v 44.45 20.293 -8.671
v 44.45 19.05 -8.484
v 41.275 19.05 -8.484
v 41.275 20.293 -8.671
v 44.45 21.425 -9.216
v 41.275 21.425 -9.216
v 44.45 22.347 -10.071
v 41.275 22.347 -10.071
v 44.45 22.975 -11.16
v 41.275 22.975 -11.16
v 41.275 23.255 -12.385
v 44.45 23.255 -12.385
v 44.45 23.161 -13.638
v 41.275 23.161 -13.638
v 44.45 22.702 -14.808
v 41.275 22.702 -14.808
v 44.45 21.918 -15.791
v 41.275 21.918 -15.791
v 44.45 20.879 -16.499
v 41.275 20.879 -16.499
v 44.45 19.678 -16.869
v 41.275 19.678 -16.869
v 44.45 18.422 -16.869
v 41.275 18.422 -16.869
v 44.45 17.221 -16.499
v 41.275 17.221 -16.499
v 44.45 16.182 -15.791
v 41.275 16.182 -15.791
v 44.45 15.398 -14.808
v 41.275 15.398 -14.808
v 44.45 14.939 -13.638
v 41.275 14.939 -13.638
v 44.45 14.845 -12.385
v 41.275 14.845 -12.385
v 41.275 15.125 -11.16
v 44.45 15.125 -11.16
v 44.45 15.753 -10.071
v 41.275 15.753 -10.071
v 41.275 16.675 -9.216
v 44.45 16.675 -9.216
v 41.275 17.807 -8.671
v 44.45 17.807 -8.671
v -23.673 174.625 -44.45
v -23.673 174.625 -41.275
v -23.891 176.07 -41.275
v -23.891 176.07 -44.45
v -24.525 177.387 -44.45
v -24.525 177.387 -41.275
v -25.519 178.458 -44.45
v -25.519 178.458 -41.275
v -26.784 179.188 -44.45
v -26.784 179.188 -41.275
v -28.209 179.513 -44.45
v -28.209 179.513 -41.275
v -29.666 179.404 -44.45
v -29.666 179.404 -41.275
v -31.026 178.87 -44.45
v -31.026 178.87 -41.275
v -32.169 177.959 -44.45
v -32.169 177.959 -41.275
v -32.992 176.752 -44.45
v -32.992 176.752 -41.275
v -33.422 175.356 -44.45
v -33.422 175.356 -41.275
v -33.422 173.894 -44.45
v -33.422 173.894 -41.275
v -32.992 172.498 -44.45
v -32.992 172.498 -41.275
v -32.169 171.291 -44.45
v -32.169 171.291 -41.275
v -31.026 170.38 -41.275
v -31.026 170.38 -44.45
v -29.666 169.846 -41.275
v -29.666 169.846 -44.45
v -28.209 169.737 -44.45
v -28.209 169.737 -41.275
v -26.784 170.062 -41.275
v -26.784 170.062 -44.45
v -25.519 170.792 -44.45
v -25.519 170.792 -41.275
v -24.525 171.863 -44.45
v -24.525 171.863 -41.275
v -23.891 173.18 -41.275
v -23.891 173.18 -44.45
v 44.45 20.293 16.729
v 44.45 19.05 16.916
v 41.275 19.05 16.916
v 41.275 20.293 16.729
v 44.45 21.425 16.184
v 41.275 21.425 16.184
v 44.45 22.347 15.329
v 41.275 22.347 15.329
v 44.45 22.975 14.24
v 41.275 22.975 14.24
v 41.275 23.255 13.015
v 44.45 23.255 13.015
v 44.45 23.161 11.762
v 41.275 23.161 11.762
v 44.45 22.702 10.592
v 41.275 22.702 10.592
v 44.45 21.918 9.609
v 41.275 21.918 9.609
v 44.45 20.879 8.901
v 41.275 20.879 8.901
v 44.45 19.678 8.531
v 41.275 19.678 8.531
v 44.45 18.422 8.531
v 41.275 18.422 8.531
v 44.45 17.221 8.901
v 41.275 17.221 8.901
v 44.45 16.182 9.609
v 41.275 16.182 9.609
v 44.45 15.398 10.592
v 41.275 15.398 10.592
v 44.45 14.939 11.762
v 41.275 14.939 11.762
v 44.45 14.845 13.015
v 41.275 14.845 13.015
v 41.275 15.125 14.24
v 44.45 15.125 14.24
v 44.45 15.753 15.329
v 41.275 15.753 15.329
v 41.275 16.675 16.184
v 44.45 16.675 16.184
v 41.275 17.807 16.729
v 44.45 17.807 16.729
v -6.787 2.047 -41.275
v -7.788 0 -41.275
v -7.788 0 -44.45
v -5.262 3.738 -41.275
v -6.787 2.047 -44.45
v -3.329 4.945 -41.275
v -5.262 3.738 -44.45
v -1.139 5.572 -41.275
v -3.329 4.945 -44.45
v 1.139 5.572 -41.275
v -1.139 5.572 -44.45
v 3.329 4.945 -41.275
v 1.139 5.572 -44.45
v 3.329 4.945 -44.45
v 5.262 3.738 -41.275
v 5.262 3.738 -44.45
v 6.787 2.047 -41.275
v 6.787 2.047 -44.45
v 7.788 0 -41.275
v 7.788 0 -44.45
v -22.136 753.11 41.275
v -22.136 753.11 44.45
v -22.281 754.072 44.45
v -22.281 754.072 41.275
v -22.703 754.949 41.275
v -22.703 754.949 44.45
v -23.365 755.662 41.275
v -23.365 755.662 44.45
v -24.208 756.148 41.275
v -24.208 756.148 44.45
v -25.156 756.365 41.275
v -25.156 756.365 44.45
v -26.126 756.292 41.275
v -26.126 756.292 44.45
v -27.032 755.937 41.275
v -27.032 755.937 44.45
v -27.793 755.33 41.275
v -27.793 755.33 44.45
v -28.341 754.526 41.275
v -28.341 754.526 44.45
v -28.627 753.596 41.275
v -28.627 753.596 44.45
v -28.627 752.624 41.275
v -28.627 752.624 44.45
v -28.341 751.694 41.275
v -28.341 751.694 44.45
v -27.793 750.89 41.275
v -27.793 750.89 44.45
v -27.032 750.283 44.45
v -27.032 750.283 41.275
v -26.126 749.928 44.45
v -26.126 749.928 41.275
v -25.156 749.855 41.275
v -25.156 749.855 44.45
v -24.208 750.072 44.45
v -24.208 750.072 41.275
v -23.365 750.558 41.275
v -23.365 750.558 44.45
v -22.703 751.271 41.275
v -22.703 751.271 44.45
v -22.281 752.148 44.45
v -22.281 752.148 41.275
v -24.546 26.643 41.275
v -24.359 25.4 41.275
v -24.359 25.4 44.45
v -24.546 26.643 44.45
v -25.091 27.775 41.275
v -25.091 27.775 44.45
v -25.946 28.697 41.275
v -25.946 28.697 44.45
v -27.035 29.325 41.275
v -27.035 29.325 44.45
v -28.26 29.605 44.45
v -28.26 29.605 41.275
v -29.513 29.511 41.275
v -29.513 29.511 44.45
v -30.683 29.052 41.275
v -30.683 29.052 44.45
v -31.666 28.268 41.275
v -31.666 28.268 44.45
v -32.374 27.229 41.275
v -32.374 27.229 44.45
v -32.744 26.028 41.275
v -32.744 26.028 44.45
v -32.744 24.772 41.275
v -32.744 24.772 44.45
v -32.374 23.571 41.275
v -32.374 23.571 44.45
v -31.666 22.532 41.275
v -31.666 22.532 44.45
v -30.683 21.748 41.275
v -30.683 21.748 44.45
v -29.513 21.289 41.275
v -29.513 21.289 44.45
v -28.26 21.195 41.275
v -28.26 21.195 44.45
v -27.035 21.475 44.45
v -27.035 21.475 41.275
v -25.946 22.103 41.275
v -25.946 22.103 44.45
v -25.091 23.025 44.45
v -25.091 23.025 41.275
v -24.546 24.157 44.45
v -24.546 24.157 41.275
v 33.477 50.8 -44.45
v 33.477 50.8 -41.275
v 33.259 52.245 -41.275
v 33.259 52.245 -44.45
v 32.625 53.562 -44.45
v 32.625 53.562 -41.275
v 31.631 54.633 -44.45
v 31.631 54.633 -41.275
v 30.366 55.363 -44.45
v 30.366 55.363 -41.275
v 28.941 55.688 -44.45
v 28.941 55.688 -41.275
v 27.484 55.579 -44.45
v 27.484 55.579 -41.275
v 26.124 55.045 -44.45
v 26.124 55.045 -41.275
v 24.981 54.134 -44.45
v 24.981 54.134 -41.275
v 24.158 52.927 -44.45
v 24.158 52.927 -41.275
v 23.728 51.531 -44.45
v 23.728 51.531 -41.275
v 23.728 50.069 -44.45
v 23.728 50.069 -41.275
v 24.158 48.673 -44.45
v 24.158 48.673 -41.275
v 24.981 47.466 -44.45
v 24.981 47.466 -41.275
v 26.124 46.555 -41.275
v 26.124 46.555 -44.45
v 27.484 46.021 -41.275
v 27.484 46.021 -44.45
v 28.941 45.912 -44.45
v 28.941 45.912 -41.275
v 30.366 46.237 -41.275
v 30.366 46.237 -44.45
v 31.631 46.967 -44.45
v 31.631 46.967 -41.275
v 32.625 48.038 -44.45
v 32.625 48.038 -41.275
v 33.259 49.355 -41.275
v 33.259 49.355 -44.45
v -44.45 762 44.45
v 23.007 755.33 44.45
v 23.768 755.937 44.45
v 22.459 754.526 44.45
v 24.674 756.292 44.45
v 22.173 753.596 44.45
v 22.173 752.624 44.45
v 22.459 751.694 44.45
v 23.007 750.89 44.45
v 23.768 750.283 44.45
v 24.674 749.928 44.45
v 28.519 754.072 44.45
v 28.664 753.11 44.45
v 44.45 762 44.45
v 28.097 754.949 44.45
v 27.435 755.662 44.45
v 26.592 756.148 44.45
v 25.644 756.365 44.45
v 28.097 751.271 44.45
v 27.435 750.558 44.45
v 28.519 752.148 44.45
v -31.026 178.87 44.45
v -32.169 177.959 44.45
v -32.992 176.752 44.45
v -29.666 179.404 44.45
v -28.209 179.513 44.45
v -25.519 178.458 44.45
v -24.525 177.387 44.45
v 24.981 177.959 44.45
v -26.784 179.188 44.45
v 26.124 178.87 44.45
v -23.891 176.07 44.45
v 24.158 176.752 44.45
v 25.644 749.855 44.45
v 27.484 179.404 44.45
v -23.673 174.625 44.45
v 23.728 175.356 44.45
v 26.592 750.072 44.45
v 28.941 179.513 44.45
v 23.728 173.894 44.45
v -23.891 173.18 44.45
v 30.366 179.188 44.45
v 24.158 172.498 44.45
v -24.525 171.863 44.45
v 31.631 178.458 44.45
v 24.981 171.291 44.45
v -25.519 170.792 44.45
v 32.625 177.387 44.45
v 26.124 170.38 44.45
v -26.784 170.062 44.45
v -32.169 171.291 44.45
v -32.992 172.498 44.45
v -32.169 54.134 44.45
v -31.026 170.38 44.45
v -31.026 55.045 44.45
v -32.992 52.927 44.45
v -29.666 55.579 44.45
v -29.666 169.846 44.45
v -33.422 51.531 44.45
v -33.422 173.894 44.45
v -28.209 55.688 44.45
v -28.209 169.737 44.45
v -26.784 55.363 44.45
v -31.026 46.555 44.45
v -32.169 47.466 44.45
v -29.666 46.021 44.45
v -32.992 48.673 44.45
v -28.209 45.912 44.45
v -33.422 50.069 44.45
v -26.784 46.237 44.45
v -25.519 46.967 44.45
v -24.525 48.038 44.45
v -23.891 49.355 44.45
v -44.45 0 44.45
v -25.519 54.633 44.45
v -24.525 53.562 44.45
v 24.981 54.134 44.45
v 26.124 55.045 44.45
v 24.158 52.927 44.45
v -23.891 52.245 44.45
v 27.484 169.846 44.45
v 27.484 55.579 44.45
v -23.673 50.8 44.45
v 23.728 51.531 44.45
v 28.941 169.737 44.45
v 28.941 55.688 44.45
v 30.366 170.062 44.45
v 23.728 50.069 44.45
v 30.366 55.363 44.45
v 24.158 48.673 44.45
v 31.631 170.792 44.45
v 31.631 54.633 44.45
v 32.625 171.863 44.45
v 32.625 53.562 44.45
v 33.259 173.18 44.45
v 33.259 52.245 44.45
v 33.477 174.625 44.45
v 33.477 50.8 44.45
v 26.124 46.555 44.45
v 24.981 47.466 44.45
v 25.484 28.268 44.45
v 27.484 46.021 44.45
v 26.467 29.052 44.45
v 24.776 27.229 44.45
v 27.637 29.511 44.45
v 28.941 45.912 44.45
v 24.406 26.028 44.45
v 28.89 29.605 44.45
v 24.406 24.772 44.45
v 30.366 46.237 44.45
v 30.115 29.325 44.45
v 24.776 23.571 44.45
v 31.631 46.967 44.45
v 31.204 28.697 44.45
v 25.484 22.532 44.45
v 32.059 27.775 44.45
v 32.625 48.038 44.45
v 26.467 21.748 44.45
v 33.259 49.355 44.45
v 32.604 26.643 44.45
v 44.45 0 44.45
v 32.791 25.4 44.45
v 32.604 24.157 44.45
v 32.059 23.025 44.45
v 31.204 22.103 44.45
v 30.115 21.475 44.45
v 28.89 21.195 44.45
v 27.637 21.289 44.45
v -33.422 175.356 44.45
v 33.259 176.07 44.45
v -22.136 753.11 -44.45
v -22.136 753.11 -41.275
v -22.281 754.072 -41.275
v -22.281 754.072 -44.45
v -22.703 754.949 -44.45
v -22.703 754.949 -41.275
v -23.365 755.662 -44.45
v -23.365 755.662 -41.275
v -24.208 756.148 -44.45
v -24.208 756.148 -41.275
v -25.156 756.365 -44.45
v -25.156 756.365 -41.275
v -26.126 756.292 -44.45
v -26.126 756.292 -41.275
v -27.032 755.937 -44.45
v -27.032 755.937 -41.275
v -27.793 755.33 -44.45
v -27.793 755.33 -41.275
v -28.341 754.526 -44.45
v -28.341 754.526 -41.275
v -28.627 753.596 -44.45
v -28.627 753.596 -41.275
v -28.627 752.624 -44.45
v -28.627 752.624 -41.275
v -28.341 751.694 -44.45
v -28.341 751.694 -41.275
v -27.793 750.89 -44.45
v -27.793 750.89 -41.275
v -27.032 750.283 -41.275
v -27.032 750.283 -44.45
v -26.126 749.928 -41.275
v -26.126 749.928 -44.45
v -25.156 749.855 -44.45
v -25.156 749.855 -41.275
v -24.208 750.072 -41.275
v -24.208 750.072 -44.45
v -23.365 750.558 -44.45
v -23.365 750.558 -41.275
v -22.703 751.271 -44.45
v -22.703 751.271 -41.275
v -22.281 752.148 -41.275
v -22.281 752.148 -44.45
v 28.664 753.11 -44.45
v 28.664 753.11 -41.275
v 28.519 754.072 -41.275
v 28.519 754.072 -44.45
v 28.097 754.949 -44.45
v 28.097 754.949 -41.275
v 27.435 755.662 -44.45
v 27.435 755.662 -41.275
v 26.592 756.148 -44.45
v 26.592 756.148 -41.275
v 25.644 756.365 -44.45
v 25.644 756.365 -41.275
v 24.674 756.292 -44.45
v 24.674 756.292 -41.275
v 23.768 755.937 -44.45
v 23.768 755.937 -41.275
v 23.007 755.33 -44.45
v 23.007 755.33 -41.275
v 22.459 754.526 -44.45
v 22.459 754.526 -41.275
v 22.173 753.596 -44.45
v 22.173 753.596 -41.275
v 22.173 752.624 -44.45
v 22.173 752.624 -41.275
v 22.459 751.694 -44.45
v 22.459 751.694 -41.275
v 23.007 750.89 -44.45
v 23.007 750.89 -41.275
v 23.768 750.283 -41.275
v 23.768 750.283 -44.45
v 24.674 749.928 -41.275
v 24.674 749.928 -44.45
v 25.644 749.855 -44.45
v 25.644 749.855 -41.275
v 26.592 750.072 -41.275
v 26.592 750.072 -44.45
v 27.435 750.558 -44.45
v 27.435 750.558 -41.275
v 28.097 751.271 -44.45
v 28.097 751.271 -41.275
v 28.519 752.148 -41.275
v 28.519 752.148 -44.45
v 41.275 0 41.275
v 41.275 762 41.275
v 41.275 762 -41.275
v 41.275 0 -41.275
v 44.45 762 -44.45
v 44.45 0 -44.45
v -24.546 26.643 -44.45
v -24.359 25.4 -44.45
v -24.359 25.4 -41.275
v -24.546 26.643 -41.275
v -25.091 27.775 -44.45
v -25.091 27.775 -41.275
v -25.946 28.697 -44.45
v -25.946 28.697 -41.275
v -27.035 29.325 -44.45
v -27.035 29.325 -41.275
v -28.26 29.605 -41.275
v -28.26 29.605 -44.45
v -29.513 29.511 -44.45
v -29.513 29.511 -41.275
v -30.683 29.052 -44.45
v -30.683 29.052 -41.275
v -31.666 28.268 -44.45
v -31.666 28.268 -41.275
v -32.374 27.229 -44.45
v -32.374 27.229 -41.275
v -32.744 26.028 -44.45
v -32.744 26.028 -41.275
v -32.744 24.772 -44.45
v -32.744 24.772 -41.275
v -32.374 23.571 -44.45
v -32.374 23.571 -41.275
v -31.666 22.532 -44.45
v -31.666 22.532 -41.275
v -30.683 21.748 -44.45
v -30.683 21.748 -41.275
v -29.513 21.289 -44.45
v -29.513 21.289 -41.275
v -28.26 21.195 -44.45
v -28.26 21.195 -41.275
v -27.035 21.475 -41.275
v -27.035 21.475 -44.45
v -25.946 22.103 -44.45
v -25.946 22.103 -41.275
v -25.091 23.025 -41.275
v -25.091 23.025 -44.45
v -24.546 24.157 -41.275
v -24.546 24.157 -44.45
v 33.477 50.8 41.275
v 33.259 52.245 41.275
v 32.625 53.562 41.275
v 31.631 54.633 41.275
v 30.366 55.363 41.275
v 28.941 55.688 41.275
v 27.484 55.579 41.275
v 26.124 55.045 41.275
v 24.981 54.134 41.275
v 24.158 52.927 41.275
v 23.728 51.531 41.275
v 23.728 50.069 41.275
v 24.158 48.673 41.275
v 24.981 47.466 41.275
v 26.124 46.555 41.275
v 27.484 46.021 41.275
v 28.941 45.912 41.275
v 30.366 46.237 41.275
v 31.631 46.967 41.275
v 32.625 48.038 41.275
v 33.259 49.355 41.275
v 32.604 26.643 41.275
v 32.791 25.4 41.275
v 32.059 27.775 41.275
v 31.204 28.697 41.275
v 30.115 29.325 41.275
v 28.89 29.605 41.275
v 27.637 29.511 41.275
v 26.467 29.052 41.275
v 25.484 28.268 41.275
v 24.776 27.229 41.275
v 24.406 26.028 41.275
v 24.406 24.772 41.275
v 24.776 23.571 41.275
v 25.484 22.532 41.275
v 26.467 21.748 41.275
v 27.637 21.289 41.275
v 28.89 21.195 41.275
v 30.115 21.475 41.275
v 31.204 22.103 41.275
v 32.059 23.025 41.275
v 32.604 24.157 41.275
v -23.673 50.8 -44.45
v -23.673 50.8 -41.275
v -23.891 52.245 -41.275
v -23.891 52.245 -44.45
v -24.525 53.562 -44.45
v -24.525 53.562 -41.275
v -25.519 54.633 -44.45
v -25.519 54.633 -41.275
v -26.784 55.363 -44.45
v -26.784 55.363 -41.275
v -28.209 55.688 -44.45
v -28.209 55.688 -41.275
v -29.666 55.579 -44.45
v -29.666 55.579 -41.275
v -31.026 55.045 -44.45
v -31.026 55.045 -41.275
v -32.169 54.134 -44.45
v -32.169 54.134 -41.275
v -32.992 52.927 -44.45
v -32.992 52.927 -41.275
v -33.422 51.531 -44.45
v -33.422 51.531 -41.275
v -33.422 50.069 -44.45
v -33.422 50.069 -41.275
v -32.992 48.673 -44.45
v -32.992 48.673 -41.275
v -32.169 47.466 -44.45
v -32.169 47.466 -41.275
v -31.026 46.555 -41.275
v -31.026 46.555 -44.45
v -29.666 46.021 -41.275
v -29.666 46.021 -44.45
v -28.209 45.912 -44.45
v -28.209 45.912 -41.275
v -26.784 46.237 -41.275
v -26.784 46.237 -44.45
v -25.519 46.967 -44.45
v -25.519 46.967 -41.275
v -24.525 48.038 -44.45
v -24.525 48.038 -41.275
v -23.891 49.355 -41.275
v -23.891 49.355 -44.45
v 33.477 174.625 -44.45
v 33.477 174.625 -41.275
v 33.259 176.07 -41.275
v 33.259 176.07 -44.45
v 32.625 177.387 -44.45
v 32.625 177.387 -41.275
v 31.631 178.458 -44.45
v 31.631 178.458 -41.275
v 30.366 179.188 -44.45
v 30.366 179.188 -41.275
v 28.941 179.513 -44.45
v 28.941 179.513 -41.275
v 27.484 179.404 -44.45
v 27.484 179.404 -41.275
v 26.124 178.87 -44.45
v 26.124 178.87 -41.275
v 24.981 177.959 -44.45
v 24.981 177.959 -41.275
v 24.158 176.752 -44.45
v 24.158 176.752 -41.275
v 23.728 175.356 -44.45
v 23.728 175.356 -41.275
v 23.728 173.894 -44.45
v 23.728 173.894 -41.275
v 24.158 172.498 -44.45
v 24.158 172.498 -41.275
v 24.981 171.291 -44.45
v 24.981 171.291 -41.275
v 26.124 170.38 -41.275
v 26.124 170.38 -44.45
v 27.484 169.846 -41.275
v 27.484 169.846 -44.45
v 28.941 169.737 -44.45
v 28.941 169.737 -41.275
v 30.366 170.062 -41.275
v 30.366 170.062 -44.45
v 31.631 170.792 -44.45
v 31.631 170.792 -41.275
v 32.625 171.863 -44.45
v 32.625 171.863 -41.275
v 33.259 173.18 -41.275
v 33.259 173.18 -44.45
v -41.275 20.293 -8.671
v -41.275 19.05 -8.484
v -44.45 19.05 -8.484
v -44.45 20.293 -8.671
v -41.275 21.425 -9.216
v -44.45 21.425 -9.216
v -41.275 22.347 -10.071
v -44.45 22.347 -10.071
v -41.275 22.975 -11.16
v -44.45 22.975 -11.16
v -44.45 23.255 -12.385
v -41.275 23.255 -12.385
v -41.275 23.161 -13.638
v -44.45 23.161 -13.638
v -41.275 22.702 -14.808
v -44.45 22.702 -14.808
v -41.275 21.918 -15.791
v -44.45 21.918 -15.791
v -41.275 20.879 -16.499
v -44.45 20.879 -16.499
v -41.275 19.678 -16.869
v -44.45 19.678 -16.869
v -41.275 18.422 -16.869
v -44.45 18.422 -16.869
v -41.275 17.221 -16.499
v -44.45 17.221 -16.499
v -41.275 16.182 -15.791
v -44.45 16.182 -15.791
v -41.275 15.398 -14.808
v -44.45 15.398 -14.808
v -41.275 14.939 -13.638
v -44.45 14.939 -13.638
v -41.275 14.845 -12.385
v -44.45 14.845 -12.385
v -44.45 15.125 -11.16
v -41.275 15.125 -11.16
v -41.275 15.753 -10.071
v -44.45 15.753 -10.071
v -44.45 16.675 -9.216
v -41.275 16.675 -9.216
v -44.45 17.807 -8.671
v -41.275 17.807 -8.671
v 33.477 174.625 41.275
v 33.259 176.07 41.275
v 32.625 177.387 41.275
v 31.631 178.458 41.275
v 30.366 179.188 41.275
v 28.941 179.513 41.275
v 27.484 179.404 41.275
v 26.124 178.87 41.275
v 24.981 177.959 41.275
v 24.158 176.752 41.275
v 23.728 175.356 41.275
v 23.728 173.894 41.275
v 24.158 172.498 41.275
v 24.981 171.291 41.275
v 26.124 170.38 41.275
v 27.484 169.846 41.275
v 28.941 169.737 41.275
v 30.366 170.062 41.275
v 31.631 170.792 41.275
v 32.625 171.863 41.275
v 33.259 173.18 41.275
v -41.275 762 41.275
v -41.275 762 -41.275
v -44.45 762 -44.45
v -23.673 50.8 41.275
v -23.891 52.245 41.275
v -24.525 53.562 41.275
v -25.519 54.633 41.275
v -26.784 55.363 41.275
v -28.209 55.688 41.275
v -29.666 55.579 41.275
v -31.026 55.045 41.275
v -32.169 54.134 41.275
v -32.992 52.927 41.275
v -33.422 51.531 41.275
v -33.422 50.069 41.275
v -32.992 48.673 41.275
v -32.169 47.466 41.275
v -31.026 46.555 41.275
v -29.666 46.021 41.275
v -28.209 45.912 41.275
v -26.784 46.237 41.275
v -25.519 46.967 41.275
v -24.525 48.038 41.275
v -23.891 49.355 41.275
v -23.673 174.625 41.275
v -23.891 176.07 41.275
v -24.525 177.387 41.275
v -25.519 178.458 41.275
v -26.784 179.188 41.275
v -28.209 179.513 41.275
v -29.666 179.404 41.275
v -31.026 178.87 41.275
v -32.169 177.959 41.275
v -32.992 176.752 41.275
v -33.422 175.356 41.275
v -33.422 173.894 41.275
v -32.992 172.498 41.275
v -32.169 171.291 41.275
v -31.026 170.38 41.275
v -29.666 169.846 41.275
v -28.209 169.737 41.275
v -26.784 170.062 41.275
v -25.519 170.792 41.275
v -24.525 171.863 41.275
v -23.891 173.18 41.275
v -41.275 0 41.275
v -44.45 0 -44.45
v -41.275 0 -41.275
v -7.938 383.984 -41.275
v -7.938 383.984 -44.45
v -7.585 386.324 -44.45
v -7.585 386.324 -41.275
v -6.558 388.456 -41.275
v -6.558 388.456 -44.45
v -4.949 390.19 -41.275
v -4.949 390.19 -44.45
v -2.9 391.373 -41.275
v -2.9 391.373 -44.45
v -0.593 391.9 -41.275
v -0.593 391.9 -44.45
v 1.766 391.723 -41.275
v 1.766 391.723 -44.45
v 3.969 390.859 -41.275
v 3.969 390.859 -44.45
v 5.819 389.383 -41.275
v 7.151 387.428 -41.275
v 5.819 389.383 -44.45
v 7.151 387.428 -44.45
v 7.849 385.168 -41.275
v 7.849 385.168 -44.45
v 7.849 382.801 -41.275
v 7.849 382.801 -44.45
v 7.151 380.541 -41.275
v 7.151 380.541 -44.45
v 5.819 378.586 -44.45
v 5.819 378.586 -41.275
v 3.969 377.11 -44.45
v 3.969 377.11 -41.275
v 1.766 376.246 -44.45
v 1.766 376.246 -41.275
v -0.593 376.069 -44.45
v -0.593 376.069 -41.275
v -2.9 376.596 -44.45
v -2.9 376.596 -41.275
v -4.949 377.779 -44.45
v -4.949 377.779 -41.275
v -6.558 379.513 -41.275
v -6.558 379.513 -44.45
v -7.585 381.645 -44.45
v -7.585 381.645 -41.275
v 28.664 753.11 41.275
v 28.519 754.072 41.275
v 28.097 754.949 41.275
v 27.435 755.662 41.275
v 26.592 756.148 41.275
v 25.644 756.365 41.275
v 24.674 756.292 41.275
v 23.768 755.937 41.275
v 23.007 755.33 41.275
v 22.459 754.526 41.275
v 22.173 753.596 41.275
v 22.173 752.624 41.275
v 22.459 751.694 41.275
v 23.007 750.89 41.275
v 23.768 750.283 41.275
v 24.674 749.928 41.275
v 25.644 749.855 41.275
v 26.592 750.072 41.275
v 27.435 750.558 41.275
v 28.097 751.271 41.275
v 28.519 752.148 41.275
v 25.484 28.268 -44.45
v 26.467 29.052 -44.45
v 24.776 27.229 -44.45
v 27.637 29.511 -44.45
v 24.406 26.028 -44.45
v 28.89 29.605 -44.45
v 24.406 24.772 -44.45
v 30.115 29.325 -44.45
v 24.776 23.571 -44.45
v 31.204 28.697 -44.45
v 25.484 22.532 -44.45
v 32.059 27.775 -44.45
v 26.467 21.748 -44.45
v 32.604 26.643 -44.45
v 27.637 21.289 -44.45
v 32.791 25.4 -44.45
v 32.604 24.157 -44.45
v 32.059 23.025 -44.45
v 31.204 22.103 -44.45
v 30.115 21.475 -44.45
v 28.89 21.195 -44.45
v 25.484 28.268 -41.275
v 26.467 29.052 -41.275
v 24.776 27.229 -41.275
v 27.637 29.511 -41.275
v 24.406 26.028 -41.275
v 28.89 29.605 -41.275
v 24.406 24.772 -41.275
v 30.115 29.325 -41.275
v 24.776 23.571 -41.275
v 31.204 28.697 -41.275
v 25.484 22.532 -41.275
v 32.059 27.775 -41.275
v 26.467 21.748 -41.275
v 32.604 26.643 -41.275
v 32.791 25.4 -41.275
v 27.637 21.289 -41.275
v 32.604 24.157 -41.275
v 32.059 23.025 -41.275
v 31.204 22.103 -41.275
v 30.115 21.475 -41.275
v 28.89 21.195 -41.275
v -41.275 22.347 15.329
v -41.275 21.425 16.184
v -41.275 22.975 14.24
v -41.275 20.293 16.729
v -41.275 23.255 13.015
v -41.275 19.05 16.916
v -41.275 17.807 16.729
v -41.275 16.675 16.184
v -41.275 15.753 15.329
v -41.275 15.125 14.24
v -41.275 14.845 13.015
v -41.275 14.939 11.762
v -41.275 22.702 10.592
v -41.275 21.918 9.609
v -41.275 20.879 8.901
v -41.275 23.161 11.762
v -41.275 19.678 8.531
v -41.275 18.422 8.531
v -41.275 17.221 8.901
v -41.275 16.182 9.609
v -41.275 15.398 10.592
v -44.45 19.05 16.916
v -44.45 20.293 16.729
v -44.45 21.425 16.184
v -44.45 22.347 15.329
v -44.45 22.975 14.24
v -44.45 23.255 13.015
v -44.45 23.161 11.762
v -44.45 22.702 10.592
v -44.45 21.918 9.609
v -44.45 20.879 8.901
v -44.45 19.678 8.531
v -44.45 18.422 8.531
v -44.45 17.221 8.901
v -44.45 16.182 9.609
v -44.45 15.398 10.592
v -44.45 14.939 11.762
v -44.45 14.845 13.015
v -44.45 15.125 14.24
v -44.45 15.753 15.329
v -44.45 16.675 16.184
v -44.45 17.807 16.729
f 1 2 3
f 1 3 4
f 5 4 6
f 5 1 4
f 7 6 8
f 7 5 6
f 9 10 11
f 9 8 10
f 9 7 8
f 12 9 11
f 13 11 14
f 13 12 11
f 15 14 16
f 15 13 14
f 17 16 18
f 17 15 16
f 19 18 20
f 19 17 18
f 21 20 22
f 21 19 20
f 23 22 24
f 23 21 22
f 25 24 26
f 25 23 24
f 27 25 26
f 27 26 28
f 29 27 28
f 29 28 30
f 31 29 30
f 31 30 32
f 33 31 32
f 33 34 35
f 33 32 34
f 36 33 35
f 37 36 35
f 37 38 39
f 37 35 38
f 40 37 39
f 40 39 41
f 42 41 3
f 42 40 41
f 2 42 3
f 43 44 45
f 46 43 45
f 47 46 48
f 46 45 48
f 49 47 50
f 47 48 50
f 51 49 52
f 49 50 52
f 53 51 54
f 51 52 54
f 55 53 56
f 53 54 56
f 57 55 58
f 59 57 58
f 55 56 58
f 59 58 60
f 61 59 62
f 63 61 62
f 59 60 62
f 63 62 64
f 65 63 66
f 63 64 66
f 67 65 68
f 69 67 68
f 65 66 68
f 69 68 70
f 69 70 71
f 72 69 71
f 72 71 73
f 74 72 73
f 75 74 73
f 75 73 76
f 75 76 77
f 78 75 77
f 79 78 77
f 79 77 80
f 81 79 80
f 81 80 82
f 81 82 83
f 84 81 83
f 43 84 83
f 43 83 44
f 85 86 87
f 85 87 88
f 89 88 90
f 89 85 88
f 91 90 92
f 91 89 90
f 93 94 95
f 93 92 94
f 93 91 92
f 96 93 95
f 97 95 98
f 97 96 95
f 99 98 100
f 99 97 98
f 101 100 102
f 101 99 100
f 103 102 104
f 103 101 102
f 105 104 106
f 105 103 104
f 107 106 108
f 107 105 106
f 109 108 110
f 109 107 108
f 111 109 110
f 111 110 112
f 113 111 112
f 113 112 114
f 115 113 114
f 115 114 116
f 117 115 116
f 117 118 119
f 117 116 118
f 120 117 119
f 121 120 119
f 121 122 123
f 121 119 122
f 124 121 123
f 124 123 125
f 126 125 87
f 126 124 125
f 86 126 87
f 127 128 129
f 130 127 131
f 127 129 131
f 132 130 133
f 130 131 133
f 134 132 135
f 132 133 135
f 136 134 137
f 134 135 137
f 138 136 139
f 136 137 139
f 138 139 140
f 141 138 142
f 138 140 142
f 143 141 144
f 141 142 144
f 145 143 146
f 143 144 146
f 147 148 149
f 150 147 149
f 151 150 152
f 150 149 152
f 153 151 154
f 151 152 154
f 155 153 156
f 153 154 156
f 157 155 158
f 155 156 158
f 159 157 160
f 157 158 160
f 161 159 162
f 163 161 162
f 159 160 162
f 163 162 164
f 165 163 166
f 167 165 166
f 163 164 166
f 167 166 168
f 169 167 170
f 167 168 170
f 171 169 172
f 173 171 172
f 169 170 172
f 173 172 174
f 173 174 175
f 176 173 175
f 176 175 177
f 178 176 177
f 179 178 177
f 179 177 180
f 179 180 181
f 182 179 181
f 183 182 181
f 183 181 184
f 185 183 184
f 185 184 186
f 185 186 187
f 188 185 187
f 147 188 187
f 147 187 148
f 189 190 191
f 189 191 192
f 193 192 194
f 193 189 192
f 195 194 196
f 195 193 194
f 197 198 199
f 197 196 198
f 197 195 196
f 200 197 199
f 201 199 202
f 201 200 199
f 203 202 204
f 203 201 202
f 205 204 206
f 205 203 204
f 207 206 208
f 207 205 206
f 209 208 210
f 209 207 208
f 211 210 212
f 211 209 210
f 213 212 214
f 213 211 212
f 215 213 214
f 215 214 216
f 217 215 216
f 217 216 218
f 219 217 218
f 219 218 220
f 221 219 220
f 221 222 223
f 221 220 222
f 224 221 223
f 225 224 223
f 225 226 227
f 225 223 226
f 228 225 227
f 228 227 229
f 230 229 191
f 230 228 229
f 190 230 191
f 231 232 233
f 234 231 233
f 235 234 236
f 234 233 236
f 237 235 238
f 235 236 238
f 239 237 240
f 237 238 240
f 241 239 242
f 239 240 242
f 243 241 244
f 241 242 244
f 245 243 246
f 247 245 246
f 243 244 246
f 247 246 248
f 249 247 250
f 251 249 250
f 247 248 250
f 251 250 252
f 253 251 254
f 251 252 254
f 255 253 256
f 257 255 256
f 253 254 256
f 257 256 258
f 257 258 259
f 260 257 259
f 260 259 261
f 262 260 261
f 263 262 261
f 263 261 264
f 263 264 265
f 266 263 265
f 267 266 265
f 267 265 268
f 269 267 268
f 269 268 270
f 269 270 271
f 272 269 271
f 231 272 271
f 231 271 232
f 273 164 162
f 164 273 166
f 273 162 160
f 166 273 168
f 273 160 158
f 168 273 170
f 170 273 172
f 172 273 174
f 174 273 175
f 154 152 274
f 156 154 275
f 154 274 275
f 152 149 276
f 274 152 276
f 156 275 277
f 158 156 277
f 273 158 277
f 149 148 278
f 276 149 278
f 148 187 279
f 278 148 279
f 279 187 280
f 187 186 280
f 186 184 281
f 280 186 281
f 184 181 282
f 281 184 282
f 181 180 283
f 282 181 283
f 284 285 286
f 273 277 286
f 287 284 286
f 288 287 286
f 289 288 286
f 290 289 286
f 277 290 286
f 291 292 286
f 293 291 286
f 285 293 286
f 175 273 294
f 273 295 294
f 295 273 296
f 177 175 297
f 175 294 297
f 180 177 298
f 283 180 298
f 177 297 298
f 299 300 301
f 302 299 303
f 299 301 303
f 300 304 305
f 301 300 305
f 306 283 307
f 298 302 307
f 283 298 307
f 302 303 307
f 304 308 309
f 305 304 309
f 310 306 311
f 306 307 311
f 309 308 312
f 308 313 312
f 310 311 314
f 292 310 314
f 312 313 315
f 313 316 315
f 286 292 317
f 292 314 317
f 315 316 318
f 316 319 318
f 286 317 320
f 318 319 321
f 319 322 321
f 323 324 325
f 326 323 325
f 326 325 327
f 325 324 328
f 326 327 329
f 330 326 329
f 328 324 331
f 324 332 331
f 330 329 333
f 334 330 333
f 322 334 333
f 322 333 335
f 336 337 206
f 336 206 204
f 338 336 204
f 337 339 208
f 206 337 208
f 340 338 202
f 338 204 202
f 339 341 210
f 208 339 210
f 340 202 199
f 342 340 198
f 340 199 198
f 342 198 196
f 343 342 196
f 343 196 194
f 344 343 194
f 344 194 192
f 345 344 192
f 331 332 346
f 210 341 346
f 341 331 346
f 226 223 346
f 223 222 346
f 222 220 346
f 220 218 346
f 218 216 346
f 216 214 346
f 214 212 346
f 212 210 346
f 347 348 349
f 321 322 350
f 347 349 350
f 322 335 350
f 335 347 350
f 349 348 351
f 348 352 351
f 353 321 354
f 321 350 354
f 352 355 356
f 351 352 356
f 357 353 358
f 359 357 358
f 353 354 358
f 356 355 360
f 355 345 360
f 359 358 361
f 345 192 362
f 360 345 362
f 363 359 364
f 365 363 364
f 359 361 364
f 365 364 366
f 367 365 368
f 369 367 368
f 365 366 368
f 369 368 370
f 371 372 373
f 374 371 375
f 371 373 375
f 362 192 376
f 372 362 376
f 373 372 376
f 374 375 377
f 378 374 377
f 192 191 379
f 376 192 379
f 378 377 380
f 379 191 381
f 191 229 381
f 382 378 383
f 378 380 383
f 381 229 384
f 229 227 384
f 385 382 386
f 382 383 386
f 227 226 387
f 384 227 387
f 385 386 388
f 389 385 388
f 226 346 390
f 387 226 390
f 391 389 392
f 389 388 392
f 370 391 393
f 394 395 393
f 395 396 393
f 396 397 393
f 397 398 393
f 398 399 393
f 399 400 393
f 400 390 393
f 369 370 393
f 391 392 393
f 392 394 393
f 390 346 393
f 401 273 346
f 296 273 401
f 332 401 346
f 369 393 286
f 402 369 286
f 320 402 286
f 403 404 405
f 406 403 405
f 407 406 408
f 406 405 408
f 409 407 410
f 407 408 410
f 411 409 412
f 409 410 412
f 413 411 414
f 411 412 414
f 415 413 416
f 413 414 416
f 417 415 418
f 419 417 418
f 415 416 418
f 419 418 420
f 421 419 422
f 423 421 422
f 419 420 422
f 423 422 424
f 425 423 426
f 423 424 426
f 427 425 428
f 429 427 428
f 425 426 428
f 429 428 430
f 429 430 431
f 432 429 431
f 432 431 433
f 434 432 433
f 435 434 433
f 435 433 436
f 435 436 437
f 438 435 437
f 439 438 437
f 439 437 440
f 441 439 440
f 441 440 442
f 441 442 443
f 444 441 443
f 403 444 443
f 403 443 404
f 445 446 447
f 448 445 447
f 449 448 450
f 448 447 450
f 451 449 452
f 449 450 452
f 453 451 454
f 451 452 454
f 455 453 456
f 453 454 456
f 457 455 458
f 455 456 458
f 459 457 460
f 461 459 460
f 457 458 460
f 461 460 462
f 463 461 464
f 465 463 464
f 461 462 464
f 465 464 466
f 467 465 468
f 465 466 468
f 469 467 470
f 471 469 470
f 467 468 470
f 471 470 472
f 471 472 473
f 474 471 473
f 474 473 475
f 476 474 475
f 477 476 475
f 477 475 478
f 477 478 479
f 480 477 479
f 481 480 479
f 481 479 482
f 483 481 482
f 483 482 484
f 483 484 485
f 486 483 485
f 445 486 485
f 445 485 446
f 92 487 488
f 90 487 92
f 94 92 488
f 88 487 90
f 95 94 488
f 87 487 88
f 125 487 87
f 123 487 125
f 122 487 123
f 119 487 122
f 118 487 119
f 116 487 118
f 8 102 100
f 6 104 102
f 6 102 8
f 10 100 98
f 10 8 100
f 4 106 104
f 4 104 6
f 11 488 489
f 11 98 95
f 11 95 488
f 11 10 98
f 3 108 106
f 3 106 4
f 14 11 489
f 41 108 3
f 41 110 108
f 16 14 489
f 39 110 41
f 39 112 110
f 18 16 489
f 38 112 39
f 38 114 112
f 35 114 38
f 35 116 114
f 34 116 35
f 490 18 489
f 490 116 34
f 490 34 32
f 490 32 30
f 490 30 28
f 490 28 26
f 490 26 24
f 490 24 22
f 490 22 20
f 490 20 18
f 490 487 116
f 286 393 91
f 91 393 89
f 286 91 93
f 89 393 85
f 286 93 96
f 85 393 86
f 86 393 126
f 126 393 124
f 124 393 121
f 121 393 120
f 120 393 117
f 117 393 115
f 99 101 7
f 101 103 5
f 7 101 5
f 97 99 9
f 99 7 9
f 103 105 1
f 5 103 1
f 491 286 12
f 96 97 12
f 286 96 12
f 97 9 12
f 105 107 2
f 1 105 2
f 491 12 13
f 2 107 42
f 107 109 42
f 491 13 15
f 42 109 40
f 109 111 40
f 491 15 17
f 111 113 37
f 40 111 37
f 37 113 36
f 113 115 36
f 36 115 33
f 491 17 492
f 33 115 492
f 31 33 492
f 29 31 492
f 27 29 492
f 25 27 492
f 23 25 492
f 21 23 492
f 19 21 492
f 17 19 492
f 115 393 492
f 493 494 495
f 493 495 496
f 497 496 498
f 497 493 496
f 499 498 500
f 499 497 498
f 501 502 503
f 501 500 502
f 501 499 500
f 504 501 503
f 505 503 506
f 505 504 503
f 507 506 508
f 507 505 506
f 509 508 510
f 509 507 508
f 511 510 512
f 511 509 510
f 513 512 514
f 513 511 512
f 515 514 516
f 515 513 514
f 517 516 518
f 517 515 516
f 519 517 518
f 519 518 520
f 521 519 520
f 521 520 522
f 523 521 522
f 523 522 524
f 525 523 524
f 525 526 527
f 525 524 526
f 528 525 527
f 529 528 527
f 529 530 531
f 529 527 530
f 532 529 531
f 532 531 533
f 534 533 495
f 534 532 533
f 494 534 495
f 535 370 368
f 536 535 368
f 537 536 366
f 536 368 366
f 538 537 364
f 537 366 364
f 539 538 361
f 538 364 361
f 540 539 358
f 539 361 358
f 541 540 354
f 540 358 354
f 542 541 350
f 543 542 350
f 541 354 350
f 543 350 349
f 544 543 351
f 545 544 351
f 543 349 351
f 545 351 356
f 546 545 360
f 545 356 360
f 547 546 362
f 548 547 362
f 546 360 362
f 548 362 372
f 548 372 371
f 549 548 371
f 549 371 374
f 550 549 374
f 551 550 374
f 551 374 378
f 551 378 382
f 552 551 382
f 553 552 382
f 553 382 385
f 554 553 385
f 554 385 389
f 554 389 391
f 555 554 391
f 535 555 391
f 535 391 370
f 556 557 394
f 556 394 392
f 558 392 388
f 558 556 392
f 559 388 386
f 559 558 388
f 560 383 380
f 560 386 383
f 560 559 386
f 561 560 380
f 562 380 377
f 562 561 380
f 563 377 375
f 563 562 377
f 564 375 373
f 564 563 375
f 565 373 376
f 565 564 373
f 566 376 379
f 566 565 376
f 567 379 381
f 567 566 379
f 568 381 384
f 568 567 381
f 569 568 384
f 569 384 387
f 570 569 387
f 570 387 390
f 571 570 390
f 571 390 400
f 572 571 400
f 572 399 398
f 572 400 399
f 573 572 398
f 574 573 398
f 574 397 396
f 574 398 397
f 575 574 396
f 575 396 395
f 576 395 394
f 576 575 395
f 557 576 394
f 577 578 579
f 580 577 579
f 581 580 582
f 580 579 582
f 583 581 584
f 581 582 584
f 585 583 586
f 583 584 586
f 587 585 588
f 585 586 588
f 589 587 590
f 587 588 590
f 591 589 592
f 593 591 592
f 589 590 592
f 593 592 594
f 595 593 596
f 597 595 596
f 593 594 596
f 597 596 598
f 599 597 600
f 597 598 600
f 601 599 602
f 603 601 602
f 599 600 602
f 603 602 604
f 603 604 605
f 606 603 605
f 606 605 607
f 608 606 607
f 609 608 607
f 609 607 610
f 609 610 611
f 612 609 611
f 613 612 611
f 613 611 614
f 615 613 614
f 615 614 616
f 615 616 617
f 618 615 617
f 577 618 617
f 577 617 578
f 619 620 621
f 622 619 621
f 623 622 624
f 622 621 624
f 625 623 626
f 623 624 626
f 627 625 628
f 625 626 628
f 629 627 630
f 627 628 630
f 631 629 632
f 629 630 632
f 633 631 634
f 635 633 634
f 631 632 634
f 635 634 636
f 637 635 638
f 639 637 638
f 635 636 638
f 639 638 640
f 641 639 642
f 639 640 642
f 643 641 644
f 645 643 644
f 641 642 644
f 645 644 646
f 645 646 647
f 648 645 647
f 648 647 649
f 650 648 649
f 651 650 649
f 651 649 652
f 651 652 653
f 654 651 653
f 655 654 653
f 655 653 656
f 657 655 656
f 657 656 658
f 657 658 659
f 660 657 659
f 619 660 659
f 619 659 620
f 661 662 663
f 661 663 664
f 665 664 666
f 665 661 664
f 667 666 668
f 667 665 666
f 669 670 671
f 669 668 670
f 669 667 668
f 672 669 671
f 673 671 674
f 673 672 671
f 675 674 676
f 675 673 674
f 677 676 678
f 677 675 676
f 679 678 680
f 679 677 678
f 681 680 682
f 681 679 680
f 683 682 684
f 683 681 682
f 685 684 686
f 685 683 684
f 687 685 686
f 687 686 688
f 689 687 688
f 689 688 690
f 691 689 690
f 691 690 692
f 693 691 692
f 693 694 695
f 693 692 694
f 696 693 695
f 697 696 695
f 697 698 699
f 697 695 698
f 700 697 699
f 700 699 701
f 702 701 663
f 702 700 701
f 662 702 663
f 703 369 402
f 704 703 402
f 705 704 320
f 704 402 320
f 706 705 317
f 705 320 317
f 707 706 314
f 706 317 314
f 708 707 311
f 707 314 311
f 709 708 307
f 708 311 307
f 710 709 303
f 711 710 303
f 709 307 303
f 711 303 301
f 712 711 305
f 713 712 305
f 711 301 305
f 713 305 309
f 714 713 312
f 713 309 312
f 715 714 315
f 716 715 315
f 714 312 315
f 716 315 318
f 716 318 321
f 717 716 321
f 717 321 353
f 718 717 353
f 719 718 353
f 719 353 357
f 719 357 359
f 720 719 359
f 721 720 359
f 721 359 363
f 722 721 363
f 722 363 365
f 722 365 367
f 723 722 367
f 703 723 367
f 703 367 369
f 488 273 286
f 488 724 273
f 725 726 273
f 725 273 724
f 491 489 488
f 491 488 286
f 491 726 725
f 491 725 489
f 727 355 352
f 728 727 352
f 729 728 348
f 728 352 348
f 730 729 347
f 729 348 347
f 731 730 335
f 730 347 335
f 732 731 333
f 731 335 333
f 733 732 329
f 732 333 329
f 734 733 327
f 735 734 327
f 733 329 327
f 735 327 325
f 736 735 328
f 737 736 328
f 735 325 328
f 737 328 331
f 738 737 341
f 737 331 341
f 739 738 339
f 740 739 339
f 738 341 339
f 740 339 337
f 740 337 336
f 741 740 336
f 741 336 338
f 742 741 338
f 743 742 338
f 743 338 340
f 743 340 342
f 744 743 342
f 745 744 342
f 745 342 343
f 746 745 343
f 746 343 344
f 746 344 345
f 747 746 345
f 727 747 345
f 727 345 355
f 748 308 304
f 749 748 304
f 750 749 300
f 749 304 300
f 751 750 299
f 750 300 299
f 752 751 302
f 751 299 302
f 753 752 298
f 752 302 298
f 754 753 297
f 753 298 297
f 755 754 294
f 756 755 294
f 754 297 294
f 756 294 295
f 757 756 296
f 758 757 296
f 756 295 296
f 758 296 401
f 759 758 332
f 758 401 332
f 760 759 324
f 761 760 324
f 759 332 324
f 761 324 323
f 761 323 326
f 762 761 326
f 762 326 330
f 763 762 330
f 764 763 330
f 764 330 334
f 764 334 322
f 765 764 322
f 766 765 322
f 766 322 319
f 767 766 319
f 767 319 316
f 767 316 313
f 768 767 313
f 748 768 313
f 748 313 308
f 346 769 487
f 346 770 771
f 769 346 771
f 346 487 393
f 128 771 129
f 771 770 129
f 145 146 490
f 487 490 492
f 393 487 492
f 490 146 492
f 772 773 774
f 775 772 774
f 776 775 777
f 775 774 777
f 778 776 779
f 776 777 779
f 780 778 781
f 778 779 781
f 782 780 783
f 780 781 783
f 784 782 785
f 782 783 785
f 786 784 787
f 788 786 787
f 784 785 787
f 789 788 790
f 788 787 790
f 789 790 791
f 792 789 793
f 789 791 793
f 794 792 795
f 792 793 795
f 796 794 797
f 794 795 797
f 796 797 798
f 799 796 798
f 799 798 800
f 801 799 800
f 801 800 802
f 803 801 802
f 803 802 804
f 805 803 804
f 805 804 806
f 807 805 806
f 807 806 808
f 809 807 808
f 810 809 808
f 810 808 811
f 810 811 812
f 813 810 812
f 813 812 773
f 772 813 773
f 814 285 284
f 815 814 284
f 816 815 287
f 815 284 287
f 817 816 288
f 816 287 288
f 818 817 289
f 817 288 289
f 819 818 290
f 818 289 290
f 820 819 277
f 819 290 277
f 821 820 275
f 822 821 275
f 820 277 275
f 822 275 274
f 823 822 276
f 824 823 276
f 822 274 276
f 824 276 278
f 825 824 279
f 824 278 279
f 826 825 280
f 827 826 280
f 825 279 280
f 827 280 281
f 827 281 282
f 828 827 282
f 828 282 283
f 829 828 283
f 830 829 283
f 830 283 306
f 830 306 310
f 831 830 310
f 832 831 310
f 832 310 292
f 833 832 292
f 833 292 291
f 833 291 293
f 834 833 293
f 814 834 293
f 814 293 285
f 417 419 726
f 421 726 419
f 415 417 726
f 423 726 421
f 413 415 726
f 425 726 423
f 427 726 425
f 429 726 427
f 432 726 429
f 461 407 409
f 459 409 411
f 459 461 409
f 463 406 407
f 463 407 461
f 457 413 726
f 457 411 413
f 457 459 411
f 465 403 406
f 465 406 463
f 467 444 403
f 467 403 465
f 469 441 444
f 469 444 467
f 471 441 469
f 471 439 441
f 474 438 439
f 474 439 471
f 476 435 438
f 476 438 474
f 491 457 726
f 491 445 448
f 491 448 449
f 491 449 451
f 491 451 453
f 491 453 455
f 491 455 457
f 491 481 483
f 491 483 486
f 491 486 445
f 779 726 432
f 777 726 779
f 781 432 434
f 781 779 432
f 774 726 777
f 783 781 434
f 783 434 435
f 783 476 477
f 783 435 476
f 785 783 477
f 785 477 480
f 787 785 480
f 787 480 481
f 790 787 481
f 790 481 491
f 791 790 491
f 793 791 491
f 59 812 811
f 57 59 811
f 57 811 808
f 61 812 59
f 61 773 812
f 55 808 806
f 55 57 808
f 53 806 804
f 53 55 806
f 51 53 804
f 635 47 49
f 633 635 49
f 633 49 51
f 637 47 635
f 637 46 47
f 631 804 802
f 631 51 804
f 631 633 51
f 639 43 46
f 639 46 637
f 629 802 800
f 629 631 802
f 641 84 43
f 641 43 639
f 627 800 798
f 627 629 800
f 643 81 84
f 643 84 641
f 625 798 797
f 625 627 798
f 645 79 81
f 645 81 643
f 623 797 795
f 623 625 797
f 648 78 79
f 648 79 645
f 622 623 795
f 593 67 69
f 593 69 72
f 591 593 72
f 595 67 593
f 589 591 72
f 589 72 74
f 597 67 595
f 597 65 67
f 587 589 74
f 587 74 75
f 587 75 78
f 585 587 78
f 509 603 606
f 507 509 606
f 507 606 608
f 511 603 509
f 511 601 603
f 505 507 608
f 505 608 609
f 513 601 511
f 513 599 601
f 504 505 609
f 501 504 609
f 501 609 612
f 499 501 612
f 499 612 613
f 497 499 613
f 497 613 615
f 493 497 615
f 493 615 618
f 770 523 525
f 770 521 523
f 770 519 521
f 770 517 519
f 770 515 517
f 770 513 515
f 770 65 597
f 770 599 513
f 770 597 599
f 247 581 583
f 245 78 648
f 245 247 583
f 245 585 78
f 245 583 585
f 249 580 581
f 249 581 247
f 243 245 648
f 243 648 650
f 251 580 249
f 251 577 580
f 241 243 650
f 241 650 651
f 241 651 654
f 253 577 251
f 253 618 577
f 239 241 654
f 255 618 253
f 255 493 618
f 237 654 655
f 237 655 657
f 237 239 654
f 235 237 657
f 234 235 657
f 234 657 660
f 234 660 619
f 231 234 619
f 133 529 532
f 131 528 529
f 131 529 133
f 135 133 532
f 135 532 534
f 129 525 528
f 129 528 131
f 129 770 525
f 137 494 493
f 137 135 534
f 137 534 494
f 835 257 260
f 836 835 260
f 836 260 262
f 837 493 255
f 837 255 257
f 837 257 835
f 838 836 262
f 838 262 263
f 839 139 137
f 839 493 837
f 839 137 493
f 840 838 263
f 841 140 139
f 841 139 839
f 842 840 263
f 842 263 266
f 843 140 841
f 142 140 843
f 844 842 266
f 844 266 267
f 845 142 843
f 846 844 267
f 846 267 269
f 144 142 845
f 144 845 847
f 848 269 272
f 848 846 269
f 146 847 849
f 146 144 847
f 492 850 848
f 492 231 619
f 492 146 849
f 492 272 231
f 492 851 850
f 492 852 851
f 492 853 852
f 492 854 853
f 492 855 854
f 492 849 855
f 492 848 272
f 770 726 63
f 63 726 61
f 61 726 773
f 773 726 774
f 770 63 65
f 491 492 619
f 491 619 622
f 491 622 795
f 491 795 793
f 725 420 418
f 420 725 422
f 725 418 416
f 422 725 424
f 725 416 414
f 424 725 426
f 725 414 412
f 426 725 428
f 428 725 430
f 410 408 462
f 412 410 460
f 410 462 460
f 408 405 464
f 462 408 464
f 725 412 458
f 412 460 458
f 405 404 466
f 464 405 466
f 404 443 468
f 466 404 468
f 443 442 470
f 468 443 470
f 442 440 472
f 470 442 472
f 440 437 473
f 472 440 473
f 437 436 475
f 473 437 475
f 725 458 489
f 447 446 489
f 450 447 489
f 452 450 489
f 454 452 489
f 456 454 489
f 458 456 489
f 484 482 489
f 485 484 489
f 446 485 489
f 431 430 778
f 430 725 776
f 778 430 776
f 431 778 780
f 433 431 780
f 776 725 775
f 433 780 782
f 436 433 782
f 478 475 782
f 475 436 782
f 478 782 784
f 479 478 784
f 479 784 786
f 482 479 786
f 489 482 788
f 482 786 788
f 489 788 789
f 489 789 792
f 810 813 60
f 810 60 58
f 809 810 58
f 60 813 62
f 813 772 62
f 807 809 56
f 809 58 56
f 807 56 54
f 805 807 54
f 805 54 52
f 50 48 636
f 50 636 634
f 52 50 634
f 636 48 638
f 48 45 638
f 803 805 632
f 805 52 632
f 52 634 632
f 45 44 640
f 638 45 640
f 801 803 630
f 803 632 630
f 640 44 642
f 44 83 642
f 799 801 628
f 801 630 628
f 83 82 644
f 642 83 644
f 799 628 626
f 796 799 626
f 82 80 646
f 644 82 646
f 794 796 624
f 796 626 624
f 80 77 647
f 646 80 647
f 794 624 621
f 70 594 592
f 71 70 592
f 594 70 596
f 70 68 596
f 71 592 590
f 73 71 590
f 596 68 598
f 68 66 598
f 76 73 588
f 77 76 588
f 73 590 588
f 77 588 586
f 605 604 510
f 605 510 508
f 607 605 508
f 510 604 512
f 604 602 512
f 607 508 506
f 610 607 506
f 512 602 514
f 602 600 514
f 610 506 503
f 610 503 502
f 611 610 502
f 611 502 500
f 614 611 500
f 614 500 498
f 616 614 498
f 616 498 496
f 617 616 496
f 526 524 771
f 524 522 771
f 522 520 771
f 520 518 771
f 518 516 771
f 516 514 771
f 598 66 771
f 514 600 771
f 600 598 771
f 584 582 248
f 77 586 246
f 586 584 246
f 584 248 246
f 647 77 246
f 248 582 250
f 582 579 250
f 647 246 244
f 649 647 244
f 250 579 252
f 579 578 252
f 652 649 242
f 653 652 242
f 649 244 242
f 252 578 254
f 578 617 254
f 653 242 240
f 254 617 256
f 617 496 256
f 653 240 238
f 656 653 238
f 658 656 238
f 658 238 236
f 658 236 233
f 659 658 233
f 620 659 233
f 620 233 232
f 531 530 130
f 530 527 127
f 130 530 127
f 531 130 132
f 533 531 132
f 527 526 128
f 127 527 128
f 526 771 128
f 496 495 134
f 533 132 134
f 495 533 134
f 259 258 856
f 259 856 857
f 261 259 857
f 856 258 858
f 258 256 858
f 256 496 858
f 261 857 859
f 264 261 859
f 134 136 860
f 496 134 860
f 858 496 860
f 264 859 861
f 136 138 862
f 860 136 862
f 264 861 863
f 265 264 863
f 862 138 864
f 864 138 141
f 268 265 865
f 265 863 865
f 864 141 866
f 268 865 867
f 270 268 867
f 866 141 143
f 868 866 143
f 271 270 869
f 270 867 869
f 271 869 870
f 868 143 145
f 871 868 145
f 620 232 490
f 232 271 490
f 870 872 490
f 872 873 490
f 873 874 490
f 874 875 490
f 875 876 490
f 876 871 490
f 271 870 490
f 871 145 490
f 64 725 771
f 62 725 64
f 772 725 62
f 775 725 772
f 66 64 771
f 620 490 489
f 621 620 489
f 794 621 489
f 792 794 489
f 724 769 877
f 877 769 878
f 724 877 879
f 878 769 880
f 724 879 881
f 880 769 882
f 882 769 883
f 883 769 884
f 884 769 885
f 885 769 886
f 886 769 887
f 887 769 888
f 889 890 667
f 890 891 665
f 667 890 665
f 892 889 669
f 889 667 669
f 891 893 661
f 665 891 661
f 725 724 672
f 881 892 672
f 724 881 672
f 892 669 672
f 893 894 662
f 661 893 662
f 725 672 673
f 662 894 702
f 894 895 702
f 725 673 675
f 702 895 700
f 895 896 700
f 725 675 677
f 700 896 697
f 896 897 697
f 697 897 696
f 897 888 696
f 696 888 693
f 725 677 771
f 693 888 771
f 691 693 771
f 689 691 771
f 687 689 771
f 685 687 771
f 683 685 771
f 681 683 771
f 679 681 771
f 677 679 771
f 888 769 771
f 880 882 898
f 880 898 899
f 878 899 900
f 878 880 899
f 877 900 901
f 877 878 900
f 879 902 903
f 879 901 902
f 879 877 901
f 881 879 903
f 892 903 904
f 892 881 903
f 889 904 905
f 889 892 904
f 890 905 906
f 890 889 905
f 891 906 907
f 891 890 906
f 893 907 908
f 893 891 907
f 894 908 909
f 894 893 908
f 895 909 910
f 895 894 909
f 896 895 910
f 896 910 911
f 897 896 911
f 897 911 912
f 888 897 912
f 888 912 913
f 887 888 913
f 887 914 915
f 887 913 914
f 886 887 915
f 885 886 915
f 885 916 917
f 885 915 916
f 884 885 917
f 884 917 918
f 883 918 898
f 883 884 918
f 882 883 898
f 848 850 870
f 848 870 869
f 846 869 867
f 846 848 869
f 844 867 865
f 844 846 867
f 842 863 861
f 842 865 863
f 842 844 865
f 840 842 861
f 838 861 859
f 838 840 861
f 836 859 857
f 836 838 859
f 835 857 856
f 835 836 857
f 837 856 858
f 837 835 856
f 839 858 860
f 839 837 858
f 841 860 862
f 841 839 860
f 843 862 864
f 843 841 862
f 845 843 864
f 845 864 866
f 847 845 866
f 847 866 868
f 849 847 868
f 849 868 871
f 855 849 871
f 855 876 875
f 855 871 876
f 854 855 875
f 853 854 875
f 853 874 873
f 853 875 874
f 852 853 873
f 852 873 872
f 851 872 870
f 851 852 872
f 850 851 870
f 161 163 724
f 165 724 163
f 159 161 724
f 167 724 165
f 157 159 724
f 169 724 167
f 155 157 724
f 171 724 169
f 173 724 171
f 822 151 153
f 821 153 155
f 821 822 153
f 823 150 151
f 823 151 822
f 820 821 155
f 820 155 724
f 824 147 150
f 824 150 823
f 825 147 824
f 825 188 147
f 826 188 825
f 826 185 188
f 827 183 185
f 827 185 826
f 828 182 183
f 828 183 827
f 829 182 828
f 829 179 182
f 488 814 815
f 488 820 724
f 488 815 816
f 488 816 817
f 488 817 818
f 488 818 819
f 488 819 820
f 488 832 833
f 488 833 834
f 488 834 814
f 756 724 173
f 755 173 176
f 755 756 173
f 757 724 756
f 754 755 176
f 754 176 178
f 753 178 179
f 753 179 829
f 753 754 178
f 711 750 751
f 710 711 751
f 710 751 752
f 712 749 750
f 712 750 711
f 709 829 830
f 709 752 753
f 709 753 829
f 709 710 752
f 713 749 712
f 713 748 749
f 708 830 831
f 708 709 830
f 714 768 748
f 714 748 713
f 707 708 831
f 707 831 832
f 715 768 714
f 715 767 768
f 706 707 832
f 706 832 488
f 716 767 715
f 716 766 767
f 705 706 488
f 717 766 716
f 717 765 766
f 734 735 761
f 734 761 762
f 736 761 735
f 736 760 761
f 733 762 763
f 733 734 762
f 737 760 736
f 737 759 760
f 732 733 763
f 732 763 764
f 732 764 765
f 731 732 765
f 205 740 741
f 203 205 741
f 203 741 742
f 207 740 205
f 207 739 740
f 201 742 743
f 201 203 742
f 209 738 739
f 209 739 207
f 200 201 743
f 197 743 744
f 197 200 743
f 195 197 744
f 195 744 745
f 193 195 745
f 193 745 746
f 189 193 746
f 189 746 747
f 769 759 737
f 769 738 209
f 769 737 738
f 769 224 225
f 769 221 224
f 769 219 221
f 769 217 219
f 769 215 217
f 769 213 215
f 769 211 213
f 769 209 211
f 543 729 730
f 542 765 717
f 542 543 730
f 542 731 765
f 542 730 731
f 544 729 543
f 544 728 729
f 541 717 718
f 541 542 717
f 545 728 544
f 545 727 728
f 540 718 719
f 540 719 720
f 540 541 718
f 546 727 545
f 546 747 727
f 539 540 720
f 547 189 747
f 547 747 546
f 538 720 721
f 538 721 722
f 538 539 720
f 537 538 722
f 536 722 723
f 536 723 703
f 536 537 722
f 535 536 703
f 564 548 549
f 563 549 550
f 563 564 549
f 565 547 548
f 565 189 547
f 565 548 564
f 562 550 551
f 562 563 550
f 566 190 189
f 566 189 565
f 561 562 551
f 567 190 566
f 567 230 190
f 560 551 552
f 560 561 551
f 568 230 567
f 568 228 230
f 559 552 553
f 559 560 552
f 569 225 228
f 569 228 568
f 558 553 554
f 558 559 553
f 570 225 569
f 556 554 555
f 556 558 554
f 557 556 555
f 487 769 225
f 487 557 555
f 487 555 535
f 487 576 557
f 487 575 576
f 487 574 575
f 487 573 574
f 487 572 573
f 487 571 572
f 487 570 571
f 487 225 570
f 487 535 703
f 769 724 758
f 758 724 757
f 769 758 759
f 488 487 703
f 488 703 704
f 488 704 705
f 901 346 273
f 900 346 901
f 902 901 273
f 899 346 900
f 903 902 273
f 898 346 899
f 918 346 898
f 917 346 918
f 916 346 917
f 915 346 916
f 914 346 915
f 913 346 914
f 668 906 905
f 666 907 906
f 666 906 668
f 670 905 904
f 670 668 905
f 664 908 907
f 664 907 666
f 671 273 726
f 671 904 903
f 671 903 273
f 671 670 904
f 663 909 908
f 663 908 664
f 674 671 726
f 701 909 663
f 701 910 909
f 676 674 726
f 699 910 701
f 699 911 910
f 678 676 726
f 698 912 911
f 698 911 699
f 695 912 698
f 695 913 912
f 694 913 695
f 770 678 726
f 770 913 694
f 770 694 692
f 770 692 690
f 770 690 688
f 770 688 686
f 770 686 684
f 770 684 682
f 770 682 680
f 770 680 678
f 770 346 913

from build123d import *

# Parameters (mm, degrees)
SKETCH1_W                      = 88.9
SKETCH1_H                      = 88.9
SKETCH1_W_2                    = 82.55
SKETCH1_H_2                    = 82.55
BOSS_EXTRUDE1_DEPTH            = 762
CUT_EXTRUDE1_DEPTH             = 765.588520055
CUT_EXTRUDE1_DEPTH_BACK        = 765.588520055
SKETCH2_R                      = 4.2164
CUT_EXTRUDE2_DEPTH             = 769.45495151
CUT_EXTRUDE2_DEPTH_BACK        = 769.45495151
SKETCH3_R                      = 8.1915
SKETCH3_R_2                    = 4.2164
CUT_EXTRUDE3_REACH             = 770.455
SKETCH4_R                      = 8.1915
CUT_EXTRUDE3_DIRECTION_2_DEPTH = 769.45495151
F_3_8_CLEARANCE_HOLE2_D        = 9.8044
SKETCH10_R                     = 7.9375
CUT_EXTRUDE4_DEPTH             = 8.128
F_1_4_CLEARANCE_HOLE1_D        = 6.5278


with BuildPart() as part:
    # Sketch1 → Boss-Extrude1 (new body)
    with BuildSketch(Plane(origin=(0, 0, 0), x_dir=(1, 0, 0), z_dir=(0, 1, 0))):
        Rectangle(SKETCH1_W, SKETCH1_H)
        Rectangle(SKETCH1_W_2, SKETCH1_H_2, mode=Mode.SUBTRACT)
    extrude(amount=BOSS_EXTRUDE1_DEPTH)

    # Sketch2 → Cut-Extrude1 (cut, two sides: drawn at the far end of the back side and taken through both)
    with BuildSketch(Plane.XY.offset(-CUT_EXTRUDE1_DEPTH_BACK)):
        with Locations((-28.575, 25.4)):
            Circle(SKETCH2_R)
        with Locations((28.575, 25.4)):
            Circle(SKETCH2_R)
    extrude(amount=CUT_EXTRUDE1_DEPTH + CUT_EXTRUDE1_DEPTH_BACK, mode=Mode.SUBTRACT)

    # Sketch3 → Cut-Extrude2 (cut, two sides: drawn at the far end of the back side and taken through both)
    with BuildSketch(Plane.ZY.offset(44.45).offset(-CUT_EXTRUDE2_DEPTH_BACK)):
        with Locations((0, -13.00951767)):
            Circle(SKETCH3_R)
        with Locations((12.7, 19.05)):
            Circle(SKETCH3_R_2)
        with Locations((-12.7, 19.05)):
            Circle(SKETCH3_R_2)
    extrude(amount=CUT_EXTRUDE2_DEPTH + CUT_EXTRUDE2_DEPTH_BACK, mode=Mode.SUBTRACT)

    # Sketch4 → Cut-Extrude3 (cut, up to next)
    with BuildSketch(Plane(origin=(0, 0, -44.45), x_dir=(-1, 0, 0), z_dir=(0, 0, -1)), mode=Mode.PRIVATE) as cut_extrude3_sk1:
        with Locations((0, -2.54)):
            Circle(SKETCH4_R)
    cut_extrude3_tool1 = extrude(cut_extrude3_sk1.sketch, amount=-CUT_EXTRUDE3_REACH, mode=Mode.PRIVATE) & part.part
    add(cut_extrude3_tool1.solids().sort_by_distance((0, -2.54, -44.45))[0], mode=Mode.SUBTRACT)

    # Sketch4 → Cut-Extrude3 direction 2 (cut)
    with BuildSketch(Plane(origin=(0, 0, -44.45), x_dir=(-1, 0, 0), z_dir=(0, 0, -1))):
        with Locations((0, -2.54)):
            Circle(SKETCH4_R)
    extrude(amount=CUT_EXTRUDE3_DIRECTION_2_DEPTH, mode=Mode.SUBTRACT)

    # 3/8 Clearance Hole2 (through all)
    with Locations(Plane(origin=(28.575, 50.8, -44.45), x_dir=(-1, 0, 0), z_dir=(0, 0, -1))):
        with Locations((0, 0), (57.15, 0), (57.15, 123.825), (0, 123.825)):
            Hole(F_3_8_CLEARANCE_HOLE2_D / 2)

    # Sketch10 → Cut-Extrude4 (cut)
    with BuildSketch(Plane(origin=(0, 0, -44.45), x_dir=(-1, 0, 0), z_dir=(0, 0, -1))):
        with Locations((0, 383.9845)):
            Circle(SKETCH10_R)
    extrude(amount=-CUT_EXTRUDE4_DEPTH, mode=Mode.SUBTRACT)

    # 1/4 Clearance Hole1 (through all)
    with Locations(Plane(origin=(0, 0, -44.45), x_dir=(-1, 0, 0), z_dir=(0, 0, -1))):
        with Locations((25.4, 753.11), (-25.4, 753.11)):
            Hole(F_1_4_CLEARANCE_HOLE1_D / 2)


solid = part.part
